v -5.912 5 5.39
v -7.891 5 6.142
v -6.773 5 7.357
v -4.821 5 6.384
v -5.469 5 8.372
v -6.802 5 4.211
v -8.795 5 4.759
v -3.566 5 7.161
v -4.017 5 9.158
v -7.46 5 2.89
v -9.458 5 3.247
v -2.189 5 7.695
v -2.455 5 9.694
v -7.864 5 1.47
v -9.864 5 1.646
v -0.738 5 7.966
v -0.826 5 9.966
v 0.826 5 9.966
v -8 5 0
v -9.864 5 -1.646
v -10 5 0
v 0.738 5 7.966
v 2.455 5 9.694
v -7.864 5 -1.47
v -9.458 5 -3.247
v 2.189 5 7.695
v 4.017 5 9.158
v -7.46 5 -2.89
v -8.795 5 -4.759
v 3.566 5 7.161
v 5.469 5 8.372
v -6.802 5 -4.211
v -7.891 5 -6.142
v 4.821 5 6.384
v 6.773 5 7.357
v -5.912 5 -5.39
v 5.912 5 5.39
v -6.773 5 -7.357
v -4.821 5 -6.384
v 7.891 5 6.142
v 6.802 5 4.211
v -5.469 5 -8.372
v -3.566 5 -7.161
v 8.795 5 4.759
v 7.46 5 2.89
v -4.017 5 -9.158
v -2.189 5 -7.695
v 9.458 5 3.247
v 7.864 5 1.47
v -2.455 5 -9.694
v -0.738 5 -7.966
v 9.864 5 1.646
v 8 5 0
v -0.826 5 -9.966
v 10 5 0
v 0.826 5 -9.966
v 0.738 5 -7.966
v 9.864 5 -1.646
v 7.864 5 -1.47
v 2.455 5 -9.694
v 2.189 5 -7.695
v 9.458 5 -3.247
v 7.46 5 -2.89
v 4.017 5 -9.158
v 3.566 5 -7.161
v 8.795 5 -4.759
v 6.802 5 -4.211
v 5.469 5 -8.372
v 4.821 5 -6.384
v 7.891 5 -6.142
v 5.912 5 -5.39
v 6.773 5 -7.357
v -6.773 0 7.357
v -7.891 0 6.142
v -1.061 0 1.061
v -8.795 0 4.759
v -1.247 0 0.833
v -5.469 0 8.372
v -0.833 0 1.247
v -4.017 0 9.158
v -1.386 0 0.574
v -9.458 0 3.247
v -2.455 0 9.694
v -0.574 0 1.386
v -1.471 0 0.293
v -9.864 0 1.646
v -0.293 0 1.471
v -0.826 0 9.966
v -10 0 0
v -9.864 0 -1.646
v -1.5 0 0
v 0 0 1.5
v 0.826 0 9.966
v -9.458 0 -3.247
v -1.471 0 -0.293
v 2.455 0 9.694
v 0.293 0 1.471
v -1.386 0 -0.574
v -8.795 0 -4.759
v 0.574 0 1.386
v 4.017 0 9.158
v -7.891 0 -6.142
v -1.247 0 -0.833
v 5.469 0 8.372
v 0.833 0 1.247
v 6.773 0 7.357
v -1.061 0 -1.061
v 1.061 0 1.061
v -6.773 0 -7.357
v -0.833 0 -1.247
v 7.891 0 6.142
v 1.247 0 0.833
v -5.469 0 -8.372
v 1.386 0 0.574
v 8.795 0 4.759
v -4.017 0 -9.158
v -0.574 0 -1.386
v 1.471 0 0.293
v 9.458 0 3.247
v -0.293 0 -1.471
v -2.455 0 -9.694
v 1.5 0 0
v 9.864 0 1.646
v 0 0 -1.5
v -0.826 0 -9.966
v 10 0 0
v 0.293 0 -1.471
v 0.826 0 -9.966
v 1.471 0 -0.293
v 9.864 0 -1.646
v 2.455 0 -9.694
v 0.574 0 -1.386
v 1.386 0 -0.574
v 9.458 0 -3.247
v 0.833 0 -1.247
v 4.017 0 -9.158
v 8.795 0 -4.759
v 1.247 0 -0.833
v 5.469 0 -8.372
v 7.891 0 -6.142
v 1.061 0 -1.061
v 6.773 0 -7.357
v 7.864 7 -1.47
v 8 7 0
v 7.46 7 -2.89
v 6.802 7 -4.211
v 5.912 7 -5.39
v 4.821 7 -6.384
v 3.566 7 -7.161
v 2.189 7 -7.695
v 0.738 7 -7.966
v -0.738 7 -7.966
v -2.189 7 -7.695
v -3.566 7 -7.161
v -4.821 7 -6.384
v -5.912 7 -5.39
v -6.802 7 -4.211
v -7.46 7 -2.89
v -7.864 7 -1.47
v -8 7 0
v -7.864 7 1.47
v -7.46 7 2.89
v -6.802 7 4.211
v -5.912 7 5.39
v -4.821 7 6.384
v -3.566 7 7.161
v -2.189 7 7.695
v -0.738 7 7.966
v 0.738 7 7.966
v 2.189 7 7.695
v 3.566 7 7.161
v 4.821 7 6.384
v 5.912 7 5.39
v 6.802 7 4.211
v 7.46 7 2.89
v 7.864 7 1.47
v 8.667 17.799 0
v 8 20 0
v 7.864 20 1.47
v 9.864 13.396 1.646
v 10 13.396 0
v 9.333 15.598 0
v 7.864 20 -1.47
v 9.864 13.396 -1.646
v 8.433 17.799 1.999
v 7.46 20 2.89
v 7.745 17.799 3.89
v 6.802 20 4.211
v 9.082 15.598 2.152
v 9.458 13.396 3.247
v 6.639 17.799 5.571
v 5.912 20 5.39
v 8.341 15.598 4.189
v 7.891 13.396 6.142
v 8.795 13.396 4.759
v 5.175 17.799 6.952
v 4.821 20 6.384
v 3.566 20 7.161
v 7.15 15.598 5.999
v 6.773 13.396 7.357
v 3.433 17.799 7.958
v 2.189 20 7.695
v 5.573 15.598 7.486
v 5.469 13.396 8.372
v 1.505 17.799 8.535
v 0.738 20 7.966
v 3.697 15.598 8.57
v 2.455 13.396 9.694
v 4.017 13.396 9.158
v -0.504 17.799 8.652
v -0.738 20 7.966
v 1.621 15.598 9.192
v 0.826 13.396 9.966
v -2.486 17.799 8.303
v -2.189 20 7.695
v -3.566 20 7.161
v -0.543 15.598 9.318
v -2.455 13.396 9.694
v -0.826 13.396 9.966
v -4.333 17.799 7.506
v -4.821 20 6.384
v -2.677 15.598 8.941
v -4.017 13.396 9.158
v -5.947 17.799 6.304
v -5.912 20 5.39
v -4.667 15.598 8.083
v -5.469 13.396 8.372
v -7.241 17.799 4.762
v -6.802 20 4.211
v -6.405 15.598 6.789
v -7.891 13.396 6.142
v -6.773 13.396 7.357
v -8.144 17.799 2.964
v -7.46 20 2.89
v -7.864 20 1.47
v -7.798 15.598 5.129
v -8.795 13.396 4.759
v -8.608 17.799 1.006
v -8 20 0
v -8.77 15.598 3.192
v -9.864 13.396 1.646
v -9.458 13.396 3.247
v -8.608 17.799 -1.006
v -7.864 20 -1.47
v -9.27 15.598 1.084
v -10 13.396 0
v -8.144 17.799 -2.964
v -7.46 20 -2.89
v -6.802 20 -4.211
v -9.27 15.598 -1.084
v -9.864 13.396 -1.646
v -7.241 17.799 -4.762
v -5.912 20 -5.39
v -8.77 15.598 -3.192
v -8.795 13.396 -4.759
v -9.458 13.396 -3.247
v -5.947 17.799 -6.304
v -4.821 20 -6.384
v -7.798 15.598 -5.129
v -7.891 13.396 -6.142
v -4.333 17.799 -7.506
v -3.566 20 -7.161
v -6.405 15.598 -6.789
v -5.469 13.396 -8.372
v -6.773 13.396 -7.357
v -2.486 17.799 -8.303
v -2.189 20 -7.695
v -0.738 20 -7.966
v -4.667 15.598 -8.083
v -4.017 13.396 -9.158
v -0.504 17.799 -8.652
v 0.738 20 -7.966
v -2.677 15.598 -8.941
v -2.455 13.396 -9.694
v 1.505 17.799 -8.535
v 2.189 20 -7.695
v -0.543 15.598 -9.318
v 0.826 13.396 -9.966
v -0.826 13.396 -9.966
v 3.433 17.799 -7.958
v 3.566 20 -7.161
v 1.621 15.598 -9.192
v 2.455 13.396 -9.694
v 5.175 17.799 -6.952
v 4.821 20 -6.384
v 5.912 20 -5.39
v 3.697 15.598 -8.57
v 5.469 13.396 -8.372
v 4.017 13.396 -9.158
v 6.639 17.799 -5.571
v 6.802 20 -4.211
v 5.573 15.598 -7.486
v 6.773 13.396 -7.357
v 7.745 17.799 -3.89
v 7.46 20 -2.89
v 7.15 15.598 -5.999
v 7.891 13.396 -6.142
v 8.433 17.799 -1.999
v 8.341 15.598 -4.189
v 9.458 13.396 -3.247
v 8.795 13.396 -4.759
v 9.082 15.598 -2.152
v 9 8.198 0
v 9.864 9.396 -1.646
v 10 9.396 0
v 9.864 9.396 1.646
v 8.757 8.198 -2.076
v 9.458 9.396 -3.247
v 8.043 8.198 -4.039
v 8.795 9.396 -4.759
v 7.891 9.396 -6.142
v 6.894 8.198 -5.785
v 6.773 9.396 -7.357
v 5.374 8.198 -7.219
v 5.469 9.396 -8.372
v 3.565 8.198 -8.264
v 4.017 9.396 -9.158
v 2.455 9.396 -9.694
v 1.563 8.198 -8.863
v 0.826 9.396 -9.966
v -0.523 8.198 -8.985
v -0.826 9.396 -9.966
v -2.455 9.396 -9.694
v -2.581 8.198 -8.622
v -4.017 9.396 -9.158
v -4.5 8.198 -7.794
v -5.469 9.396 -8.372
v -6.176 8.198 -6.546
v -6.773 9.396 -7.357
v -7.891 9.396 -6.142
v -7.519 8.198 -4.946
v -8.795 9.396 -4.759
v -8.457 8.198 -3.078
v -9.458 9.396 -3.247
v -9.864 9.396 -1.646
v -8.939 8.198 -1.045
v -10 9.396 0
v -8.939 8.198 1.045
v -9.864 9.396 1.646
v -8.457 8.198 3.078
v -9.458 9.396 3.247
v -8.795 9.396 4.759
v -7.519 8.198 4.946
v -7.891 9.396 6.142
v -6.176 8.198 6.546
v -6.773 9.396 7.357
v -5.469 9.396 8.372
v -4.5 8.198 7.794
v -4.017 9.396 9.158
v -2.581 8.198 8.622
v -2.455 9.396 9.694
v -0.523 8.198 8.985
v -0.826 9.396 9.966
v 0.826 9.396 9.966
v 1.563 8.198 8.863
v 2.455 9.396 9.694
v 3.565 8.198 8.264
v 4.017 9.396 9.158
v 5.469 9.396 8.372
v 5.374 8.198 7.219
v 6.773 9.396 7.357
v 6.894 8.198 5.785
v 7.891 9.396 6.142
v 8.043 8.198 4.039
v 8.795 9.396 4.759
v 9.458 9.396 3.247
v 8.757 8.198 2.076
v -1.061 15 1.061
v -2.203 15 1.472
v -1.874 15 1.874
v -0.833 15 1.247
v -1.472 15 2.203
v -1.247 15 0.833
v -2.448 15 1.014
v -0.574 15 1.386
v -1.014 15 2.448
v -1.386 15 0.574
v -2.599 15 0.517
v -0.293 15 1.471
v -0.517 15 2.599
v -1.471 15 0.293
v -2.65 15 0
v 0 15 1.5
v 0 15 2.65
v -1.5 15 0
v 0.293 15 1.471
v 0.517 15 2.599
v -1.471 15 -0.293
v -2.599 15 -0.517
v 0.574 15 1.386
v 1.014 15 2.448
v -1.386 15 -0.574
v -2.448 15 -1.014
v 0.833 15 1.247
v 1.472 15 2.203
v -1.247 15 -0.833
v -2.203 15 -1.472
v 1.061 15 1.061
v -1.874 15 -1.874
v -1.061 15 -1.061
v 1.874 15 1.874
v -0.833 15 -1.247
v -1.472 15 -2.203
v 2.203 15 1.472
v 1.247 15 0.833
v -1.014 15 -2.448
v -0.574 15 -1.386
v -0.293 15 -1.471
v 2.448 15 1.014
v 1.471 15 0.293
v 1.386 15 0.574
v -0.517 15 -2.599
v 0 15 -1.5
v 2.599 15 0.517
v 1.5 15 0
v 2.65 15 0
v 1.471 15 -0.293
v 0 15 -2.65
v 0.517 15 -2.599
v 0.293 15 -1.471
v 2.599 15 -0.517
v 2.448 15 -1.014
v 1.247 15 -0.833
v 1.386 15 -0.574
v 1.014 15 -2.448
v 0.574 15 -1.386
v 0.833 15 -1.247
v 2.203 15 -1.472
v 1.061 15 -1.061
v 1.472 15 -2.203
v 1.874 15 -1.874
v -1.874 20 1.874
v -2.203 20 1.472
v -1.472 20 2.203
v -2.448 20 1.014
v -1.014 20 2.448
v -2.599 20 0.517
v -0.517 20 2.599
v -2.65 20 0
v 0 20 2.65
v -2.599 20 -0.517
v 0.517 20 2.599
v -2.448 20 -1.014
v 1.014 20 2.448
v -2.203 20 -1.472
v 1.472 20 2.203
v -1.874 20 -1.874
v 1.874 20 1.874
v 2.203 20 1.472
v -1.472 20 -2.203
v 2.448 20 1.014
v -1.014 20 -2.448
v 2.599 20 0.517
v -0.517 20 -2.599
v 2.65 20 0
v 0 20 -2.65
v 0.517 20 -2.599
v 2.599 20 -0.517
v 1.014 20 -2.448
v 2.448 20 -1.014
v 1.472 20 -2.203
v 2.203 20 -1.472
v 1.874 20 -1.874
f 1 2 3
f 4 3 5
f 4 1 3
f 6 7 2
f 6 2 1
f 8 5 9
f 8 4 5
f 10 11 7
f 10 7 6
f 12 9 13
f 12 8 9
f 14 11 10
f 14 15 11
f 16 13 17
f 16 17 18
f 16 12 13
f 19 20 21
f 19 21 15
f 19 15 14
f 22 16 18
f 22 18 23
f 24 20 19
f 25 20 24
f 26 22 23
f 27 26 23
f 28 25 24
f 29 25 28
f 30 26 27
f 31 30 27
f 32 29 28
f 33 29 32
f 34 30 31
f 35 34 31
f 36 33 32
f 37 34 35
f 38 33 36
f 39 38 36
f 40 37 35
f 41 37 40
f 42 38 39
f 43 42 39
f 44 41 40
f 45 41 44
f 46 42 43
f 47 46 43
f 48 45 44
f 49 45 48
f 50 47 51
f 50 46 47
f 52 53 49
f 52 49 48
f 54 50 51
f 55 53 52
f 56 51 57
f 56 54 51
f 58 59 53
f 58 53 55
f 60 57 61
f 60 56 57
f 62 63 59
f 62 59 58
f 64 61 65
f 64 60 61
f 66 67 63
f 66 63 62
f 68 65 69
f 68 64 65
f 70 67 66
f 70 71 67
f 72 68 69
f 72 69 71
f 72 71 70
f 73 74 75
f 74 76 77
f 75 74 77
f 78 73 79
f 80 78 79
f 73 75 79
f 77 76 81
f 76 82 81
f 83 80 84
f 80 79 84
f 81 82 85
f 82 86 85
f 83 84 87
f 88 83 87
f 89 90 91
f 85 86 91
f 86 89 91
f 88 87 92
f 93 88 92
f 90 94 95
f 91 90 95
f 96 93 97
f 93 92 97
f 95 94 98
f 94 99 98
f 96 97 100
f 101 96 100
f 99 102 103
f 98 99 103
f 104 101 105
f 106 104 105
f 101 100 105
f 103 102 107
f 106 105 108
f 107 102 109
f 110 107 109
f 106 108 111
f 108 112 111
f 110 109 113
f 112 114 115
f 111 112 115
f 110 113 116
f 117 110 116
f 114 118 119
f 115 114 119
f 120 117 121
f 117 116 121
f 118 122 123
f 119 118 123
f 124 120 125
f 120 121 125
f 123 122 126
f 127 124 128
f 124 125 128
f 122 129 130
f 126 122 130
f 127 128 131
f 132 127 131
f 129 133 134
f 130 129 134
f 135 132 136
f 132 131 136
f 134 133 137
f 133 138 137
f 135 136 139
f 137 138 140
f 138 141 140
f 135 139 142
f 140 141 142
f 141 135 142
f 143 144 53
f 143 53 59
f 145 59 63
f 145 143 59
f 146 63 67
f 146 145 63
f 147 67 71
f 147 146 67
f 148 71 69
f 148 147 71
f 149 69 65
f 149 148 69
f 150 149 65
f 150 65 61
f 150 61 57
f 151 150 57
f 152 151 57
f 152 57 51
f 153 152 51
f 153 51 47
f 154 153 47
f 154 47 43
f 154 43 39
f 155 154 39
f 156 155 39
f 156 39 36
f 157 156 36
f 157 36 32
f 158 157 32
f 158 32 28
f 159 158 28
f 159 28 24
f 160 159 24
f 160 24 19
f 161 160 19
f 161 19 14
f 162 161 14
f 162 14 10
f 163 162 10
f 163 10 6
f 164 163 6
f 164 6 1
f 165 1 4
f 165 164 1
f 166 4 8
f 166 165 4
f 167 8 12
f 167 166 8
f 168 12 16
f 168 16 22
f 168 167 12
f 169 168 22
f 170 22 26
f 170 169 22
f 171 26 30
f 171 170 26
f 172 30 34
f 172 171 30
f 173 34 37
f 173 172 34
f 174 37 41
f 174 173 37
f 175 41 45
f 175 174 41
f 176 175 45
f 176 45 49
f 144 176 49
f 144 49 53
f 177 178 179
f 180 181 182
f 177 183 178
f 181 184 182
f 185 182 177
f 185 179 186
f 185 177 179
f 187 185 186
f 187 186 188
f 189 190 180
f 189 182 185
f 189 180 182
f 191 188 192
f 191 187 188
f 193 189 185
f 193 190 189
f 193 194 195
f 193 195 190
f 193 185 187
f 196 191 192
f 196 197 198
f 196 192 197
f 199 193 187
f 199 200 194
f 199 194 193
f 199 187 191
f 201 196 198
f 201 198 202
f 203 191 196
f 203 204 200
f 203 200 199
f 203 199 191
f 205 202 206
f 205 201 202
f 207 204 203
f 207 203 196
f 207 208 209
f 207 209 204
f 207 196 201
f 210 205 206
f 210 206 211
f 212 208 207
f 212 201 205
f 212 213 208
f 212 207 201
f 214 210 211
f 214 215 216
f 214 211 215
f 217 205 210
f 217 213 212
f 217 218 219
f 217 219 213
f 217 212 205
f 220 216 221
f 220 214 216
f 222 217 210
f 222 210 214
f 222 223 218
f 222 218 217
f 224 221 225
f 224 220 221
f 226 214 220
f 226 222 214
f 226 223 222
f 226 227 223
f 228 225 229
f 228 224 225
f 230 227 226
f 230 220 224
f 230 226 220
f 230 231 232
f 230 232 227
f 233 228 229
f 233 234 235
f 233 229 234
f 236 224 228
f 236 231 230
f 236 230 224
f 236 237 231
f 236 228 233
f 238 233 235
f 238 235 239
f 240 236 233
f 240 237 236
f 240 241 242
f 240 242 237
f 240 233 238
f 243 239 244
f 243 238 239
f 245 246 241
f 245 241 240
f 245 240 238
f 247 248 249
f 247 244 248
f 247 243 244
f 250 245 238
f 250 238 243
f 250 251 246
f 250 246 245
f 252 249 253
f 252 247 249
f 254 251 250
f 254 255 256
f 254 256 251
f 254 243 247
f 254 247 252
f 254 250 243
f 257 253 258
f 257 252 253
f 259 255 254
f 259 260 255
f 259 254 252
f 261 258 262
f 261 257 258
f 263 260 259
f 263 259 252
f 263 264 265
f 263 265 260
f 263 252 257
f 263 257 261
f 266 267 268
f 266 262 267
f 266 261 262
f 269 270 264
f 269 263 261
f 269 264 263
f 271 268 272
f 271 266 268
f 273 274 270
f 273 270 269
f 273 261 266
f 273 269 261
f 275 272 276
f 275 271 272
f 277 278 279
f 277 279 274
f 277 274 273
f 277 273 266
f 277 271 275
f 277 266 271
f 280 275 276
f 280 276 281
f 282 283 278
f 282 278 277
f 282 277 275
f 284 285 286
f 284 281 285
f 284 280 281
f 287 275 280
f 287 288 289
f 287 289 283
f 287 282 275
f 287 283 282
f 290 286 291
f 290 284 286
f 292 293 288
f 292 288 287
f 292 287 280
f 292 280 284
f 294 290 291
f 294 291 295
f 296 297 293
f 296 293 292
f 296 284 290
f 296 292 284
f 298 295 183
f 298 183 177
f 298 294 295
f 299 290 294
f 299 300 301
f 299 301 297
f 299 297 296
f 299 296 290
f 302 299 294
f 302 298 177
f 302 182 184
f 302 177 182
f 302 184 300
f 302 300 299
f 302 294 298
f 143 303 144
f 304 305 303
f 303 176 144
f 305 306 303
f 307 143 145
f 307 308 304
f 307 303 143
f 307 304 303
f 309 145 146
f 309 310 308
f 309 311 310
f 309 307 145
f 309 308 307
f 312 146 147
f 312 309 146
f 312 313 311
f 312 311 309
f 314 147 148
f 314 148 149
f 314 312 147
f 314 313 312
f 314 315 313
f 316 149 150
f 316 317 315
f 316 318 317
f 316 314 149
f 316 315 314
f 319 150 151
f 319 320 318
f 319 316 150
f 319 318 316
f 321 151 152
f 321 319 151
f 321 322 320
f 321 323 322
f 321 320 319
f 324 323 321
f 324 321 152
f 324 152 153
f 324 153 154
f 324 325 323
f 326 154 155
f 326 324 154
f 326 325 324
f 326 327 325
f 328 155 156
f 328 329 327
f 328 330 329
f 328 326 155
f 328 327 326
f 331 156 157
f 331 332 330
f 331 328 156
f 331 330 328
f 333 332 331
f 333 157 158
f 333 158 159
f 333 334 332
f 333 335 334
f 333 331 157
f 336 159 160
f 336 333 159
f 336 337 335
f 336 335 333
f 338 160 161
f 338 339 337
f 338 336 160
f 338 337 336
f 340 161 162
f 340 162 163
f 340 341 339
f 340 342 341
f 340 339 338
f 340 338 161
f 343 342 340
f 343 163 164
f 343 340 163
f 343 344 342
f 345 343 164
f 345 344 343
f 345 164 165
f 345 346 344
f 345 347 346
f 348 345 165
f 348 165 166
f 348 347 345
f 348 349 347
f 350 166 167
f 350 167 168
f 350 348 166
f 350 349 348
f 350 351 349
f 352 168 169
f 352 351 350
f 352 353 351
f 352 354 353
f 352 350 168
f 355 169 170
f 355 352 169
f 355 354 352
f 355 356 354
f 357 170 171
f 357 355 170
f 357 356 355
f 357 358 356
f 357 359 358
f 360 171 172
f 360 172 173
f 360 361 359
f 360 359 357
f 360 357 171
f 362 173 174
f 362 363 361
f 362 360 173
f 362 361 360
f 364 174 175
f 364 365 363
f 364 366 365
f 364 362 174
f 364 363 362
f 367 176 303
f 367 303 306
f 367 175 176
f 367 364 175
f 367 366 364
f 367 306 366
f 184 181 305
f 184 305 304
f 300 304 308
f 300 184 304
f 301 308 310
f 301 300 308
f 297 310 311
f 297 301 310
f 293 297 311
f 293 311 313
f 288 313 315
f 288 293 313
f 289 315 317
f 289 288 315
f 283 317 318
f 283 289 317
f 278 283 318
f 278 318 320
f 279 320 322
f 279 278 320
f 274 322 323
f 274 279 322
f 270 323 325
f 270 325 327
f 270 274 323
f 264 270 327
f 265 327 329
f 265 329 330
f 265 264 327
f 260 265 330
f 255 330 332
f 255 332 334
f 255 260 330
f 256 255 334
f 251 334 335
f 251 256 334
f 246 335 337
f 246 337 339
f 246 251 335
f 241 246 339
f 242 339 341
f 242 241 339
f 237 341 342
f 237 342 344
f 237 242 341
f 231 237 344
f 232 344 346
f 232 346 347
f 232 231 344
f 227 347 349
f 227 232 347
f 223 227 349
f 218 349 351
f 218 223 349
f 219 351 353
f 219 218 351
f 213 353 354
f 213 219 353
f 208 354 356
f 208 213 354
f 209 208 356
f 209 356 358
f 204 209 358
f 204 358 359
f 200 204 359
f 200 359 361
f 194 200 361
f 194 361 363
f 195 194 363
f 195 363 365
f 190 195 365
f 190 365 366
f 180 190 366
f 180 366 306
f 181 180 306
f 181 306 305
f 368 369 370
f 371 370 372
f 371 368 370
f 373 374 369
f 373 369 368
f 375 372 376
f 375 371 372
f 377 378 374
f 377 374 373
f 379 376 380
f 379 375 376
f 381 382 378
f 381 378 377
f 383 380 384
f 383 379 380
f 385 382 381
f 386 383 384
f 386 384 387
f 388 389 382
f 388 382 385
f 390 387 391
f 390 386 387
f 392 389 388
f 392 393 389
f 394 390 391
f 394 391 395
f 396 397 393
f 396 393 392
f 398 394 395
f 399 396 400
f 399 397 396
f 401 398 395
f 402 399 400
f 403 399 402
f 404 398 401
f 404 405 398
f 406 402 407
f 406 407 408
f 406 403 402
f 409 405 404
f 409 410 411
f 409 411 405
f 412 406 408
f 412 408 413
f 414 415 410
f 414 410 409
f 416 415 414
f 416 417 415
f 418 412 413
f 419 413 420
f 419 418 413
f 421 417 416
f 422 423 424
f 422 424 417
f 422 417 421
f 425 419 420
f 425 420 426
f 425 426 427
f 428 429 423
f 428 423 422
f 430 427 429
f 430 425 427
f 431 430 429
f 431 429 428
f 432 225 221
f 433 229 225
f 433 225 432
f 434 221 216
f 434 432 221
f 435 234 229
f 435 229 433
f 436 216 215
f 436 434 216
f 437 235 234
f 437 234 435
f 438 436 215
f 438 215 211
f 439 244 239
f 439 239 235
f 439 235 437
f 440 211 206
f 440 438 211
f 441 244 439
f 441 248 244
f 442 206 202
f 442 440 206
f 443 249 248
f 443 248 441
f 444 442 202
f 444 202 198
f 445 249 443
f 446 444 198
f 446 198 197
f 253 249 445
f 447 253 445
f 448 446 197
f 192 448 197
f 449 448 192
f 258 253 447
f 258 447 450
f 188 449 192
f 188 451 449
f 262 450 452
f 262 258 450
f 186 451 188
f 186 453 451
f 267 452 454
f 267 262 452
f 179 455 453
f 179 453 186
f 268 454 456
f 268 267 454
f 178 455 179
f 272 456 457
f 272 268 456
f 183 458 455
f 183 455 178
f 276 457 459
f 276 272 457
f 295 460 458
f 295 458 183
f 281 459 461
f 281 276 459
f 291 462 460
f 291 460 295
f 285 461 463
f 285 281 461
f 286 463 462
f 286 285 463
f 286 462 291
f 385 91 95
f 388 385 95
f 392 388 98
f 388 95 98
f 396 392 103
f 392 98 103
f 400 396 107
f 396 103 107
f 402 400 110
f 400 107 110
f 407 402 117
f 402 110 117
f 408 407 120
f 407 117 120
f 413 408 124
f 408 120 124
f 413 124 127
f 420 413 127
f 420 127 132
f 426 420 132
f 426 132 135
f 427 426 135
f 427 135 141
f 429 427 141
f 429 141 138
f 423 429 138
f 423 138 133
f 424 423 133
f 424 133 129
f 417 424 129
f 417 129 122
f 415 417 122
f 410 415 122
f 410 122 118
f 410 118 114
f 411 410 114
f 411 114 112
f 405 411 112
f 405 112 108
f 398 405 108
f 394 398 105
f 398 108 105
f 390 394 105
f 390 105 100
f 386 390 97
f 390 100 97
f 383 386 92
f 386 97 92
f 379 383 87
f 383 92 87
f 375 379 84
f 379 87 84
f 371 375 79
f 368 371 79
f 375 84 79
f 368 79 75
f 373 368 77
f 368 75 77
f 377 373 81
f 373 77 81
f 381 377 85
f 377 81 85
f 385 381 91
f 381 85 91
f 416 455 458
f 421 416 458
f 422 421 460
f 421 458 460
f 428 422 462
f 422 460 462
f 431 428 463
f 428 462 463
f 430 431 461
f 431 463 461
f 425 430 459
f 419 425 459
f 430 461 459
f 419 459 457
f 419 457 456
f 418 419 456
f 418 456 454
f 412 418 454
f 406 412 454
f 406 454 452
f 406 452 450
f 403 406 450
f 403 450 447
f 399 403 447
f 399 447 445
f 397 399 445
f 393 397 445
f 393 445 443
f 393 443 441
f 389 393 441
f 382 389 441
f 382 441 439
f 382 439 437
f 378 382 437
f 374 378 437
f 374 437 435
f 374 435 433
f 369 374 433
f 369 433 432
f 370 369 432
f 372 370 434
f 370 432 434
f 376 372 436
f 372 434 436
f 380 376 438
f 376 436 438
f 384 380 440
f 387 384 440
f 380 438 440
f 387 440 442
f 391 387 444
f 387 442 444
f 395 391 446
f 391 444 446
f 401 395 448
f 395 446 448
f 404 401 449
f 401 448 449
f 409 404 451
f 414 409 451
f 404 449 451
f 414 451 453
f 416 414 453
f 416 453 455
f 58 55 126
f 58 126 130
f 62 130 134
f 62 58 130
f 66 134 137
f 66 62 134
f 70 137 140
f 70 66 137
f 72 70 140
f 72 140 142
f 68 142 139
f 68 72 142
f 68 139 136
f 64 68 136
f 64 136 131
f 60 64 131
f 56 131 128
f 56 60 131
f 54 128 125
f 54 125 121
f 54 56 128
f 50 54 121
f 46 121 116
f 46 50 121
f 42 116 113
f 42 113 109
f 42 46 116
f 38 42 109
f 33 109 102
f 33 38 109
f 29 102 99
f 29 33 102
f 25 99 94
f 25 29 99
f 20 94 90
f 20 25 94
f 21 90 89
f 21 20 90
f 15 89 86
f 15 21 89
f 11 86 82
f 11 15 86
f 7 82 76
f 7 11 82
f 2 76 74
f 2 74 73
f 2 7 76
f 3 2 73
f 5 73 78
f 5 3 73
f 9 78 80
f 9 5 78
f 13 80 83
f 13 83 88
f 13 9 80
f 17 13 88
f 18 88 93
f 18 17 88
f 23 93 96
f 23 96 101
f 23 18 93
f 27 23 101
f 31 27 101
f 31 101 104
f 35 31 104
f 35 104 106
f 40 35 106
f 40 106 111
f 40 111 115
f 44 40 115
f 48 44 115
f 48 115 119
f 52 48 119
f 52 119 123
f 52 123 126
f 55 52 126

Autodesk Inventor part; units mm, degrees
ref_plane "YZ Plane" through (0, 0, 0) normal (1, 0, 0) x (0, 1, 0)
ref_plane "XZ Plane" through (0, 0, 0) normal (0, 1, 0) x (-1, 0, 0)
ref_plane "XY Plane" through (0, 0, 0) normal (0, 0, 1) x (1, 0, 0)
sketch "Sketch3" plane through (0, 0, 0) normal (0, 0, 1) x (1, 0, 0)
  line L0 (0, 0) -> (10, 0)
  line L1 (0, 0) -> (0, 20)
  line L2 (0, 20) -> (8, 20)
  line L3 (10, 0) -> (10, 5)
  line L4 (10, 5) -> (8, 5)
  line L5 (8, 5) -> (8, 7)
  line L6 (8, 7) -> (10, 9.3965)
  line L7 (10, 9.3965) -> (10, 13.3965)
  line L8 (10, 13.3965) -> (8, 20)
  dimension "d17" = 10
  dimension "d18" = 20
  dimension "d19" = 8
  dimension "d40" = 5
  dimension "d43" = 2
  dimension "d44" = 4
  dimension "d45" = 2
revolve "Revolution1" add sketch "Sketch3" angle 360 about axis through (0, 0, 0) along (0, 1, 0)
sketch "Sketch4" plane through (0, 0, 0) normal (0, 1, 0) x (-1, 0, 0)
  circle A0 centre (0, 0) radius 1.5
  dimension "d27" = 3
extrude "Extrusion3" cut sketch "Sketch4" along normal through all
sketch "Sketch5" plane through (0, 20, 0) normal (0, 1, 0) x (1, 0, 0)
  circle A0 centre (0, 0) radius 2.65
  dimension "d30" = 5.3
extrude "Extrusion4" cut sketch "Sketch5" against normal blind 5
sketch "Sketch6" plane through (0, 0, 0) normal (0, -1, 0) x (1, 0, 0)
  circle A0 centre (-6, 0) radius 1.5
  circle A1 centre (6, 0) radius 1.5
  circle A2 centre (0, 0) radius 1.5 projected
  line L0 (-6, 0) -> (0, 0) construction
  line L1 (0, 0) -> (6, 0) construction
  dimension "d33" = 3
  dimension "d35" = 3
  dimension "d47" = 6
extrude "Extrusion5" [suppressed]
equation "\"d35\" = d33"
equation "\"d47\" = 2 * d33"
properties part number "modular-post"
